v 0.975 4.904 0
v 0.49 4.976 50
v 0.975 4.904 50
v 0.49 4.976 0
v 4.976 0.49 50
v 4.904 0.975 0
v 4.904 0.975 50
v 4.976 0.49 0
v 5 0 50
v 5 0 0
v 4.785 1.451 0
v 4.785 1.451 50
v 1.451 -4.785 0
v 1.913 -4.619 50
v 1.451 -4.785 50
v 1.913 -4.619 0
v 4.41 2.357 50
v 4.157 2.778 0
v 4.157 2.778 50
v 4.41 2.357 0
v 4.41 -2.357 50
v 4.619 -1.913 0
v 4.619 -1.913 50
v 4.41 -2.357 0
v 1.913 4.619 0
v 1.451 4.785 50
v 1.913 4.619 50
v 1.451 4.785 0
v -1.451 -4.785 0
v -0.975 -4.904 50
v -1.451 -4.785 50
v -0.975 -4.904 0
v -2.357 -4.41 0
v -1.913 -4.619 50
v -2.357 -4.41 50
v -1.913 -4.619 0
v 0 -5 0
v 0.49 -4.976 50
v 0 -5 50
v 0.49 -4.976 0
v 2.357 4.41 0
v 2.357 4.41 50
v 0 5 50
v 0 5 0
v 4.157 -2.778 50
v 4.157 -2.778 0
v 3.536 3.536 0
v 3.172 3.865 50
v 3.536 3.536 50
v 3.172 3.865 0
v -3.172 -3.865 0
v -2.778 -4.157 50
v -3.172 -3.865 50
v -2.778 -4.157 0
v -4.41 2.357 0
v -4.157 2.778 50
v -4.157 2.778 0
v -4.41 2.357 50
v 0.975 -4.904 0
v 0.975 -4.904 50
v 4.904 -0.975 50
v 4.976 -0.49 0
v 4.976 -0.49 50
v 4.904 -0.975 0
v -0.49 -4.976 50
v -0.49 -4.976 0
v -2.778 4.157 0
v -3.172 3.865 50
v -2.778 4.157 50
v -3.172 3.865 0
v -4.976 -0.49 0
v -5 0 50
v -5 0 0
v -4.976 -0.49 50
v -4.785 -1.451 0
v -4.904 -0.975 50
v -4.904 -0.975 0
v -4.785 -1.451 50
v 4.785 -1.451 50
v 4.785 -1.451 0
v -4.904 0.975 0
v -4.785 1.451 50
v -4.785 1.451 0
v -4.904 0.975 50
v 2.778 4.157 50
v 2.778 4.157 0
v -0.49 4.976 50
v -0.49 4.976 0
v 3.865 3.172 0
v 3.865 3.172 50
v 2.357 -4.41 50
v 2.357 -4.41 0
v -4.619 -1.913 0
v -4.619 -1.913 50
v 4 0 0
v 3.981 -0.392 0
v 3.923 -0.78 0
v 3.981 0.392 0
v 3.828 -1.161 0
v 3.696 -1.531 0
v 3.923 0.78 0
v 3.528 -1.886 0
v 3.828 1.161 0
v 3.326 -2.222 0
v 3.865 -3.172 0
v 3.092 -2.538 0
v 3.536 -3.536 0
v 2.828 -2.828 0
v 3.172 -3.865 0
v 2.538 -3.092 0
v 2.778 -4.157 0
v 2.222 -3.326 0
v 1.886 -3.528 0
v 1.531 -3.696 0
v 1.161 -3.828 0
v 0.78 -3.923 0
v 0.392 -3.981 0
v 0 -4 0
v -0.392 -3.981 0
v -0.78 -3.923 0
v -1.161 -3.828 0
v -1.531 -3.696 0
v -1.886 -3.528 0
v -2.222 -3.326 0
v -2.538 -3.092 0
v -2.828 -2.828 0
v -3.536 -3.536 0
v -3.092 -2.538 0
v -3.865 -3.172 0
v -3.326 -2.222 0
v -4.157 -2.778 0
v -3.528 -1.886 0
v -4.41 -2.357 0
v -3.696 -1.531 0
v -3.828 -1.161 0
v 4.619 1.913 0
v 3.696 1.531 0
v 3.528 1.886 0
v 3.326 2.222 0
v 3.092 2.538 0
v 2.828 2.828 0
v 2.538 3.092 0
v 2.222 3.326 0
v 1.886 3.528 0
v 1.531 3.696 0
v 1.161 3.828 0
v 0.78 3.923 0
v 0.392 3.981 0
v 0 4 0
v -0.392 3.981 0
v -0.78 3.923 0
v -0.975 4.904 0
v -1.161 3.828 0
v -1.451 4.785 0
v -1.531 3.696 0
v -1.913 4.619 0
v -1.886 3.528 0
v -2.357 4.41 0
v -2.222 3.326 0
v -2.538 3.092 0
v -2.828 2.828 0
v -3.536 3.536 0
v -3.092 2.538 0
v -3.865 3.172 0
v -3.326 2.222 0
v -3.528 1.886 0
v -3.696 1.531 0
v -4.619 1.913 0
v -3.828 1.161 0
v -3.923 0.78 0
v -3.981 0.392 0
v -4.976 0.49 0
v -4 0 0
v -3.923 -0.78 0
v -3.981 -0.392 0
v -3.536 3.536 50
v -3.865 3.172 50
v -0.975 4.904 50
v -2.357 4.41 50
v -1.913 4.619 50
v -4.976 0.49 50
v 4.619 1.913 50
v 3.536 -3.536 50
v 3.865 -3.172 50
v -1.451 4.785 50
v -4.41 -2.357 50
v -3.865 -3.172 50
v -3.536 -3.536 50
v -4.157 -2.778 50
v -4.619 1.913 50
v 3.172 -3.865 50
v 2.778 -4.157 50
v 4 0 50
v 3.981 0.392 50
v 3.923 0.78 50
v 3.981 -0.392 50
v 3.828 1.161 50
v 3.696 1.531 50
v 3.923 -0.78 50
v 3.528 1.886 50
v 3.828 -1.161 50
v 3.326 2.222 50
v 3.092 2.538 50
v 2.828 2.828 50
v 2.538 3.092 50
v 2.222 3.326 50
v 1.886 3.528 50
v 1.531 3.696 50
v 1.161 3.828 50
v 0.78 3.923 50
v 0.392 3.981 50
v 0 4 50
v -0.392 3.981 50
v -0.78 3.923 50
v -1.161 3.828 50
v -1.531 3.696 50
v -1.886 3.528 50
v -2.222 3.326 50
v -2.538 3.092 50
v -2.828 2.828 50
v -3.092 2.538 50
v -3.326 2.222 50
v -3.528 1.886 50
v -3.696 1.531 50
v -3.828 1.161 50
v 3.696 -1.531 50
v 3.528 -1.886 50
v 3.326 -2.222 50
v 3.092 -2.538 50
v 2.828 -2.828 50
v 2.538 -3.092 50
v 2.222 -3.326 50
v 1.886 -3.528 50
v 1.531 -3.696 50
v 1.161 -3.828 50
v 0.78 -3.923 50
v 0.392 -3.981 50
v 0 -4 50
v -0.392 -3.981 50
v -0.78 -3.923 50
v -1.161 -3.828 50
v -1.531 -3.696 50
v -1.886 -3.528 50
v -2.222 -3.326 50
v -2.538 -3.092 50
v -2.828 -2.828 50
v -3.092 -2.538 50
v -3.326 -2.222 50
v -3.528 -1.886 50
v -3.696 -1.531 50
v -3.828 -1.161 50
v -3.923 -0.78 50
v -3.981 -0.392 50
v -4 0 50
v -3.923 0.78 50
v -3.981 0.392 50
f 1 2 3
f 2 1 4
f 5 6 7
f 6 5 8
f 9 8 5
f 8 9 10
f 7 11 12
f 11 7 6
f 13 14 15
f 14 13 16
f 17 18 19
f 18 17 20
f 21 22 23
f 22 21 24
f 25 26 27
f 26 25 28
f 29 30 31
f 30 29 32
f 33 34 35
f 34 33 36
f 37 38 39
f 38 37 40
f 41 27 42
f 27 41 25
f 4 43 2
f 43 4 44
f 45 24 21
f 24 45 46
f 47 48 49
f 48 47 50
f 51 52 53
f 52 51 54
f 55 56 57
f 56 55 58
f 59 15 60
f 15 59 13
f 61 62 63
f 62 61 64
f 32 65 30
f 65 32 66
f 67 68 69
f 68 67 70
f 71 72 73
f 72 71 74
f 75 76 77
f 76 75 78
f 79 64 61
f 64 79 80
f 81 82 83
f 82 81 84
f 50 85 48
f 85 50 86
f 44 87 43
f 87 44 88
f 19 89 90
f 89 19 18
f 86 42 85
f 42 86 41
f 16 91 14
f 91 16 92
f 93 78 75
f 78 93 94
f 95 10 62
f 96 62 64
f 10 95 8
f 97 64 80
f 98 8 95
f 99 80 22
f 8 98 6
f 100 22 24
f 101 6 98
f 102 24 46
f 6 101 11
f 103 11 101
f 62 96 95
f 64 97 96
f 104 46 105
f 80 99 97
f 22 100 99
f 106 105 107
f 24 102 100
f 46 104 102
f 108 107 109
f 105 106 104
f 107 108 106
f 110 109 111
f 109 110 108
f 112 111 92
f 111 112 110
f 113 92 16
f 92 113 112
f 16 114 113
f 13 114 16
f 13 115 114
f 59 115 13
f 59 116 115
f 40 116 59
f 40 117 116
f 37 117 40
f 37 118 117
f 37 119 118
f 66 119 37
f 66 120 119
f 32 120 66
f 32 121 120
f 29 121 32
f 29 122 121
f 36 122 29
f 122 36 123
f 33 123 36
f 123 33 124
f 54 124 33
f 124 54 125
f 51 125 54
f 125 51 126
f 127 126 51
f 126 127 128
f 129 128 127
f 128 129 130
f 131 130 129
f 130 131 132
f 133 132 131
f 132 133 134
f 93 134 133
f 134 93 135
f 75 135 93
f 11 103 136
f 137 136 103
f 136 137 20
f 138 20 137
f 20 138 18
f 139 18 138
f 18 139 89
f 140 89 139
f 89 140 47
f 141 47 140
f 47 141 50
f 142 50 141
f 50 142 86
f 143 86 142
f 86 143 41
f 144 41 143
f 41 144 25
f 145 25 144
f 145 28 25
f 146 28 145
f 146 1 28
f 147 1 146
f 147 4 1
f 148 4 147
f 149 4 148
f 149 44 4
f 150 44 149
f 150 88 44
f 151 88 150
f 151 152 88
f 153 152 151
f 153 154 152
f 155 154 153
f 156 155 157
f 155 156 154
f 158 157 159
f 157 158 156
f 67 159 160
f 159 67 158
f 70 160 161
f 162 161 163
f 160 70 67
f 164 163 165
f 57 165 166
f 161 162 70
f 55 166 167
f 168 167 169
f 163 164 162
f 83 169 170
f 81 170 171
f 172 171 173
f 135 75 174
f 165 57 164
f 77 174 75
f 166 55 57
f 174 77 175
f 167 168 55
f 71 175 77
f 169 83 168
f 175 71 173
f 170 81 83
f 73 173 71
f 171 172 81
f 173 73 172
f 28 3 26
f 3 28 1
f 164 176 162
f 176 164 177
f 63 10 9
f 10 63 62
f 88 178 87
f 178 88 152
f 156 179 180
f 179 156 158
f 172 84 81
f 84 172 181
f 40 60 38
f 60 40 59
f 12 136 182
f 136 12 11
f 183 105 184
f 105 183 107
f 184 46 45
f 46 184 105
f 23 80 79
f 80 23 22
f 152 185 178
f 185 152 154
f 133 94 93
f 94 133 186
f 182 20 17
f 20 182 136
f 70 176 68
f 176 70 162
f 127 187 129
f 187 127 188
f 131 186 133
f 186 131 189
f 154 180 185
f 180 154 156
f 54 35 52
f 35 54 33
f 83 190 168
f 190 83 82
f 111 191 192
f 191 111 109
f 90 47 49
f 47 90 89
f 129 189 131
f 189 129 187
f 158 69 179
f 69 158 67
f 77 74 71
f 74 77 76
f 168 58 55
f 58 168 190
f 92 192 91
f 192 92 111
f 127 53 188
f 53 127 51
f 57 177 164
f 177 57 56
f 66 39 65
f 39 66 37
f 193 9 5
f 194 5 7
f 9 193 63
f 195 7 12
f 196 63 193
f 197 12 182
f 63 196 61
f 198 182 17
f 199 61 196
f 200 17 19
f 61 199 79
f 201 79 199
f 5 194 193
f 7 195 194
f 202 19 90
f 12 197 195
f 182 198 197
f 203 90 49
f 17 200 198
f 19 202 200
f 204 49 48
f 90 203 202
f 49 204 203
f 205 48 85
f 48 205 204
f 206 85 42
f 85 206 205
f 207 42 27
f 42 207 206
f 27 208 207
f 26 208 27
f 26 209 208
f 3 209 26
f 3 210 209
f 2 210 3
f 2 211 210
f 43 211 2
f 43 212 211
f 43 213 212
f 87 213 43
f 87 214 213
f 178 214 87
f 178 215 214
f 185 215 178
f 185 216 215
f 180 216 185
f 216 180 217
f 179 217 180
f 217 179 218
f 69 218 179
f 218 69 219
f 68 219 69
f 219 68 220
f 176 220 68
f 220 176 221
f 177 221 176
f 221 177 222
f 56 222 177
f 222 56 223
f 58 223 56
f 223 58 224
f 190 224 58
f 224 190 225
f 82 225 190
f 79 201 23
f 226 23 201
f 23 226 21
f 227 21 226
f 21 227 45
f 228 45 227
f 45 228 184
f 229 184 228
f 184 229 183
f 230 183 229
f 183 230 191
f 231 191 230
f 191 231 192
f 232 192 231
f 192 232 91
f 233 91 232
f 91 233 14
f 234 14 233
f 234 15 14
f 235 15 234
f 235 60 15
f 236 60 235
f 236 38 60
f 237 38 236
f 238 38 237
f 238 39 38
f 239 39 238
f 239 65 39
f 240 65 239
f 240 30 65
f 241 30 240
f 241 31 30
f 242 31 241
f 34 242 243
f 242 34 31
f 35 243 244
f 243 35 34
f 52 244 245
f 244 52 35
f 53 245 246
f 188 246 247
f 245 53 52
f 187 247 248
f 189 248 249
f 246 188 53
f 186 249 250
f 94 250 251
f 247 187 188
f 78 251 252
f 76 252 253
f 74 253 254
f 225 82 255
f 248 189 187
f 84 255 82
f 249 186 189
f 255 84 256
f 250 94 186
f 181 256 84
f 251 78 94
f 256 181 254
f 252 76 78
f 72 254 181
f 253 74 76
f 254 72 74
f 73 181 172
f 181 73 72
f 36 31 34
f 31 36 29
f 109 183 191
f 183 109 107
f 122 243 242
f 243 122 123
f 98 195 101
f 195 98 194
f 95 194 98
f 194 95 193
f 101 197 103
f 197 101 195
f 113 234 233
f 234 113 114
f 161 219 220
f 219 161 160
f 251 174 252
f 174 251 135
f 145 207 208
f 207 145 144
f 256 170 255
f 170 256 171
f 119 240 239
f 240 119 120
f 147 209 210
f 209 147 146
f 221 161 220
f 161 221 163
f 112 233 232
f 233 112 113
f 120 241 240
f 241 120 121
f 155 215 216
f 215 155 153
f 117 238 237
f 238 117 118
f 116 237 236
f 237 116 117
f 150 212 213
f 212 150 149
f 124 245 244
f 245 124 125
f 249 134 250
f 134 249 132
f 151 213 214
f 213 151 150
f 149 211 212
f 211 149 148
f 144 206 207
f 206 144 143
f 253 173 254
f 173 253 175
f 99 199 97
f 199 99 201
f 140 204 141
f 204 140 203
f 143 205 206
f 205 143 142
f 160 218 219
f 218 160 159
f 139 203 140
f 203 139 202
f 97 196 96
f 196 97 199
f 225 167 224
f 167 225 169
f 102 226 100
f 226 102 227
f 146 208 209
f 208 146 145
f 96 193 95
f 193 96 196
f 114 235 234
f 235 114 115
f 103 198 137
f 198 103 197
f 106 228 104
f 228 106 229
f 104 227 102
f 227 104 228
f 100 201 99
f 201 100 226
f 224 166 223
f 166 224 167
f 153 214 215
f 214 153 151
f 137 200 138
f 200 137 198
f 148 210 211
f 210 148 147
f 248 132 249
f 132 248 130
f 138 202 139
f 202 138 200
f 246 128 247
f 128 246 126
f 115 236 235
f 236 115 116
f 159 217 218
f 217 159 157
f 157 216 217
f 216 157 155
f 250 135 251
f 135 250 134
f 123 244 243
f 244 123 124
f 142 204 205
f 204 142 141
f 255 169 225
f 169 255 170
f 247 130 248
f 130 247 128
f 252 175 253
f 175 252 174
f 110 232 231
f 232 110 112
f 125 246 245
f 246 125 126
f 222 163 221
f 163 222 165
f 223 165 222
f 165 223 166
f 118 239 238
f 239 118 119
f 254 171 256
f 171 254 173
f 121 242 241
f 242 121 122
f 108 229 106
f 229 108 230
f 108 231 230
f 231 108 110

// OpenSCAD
module ptfe_heatshrink_sleeving(outer_diameter=10, inner_diameter=8, length=50) {
    difference() {
        cylinder(h=length, d=outer_diameter, $fn=64);
        translate([0, 0, -1])
            cylinder(h=length + 2, d=inner_diameter, $fn=64);
    }
}

ptfe_heatshrink_sleeving();
